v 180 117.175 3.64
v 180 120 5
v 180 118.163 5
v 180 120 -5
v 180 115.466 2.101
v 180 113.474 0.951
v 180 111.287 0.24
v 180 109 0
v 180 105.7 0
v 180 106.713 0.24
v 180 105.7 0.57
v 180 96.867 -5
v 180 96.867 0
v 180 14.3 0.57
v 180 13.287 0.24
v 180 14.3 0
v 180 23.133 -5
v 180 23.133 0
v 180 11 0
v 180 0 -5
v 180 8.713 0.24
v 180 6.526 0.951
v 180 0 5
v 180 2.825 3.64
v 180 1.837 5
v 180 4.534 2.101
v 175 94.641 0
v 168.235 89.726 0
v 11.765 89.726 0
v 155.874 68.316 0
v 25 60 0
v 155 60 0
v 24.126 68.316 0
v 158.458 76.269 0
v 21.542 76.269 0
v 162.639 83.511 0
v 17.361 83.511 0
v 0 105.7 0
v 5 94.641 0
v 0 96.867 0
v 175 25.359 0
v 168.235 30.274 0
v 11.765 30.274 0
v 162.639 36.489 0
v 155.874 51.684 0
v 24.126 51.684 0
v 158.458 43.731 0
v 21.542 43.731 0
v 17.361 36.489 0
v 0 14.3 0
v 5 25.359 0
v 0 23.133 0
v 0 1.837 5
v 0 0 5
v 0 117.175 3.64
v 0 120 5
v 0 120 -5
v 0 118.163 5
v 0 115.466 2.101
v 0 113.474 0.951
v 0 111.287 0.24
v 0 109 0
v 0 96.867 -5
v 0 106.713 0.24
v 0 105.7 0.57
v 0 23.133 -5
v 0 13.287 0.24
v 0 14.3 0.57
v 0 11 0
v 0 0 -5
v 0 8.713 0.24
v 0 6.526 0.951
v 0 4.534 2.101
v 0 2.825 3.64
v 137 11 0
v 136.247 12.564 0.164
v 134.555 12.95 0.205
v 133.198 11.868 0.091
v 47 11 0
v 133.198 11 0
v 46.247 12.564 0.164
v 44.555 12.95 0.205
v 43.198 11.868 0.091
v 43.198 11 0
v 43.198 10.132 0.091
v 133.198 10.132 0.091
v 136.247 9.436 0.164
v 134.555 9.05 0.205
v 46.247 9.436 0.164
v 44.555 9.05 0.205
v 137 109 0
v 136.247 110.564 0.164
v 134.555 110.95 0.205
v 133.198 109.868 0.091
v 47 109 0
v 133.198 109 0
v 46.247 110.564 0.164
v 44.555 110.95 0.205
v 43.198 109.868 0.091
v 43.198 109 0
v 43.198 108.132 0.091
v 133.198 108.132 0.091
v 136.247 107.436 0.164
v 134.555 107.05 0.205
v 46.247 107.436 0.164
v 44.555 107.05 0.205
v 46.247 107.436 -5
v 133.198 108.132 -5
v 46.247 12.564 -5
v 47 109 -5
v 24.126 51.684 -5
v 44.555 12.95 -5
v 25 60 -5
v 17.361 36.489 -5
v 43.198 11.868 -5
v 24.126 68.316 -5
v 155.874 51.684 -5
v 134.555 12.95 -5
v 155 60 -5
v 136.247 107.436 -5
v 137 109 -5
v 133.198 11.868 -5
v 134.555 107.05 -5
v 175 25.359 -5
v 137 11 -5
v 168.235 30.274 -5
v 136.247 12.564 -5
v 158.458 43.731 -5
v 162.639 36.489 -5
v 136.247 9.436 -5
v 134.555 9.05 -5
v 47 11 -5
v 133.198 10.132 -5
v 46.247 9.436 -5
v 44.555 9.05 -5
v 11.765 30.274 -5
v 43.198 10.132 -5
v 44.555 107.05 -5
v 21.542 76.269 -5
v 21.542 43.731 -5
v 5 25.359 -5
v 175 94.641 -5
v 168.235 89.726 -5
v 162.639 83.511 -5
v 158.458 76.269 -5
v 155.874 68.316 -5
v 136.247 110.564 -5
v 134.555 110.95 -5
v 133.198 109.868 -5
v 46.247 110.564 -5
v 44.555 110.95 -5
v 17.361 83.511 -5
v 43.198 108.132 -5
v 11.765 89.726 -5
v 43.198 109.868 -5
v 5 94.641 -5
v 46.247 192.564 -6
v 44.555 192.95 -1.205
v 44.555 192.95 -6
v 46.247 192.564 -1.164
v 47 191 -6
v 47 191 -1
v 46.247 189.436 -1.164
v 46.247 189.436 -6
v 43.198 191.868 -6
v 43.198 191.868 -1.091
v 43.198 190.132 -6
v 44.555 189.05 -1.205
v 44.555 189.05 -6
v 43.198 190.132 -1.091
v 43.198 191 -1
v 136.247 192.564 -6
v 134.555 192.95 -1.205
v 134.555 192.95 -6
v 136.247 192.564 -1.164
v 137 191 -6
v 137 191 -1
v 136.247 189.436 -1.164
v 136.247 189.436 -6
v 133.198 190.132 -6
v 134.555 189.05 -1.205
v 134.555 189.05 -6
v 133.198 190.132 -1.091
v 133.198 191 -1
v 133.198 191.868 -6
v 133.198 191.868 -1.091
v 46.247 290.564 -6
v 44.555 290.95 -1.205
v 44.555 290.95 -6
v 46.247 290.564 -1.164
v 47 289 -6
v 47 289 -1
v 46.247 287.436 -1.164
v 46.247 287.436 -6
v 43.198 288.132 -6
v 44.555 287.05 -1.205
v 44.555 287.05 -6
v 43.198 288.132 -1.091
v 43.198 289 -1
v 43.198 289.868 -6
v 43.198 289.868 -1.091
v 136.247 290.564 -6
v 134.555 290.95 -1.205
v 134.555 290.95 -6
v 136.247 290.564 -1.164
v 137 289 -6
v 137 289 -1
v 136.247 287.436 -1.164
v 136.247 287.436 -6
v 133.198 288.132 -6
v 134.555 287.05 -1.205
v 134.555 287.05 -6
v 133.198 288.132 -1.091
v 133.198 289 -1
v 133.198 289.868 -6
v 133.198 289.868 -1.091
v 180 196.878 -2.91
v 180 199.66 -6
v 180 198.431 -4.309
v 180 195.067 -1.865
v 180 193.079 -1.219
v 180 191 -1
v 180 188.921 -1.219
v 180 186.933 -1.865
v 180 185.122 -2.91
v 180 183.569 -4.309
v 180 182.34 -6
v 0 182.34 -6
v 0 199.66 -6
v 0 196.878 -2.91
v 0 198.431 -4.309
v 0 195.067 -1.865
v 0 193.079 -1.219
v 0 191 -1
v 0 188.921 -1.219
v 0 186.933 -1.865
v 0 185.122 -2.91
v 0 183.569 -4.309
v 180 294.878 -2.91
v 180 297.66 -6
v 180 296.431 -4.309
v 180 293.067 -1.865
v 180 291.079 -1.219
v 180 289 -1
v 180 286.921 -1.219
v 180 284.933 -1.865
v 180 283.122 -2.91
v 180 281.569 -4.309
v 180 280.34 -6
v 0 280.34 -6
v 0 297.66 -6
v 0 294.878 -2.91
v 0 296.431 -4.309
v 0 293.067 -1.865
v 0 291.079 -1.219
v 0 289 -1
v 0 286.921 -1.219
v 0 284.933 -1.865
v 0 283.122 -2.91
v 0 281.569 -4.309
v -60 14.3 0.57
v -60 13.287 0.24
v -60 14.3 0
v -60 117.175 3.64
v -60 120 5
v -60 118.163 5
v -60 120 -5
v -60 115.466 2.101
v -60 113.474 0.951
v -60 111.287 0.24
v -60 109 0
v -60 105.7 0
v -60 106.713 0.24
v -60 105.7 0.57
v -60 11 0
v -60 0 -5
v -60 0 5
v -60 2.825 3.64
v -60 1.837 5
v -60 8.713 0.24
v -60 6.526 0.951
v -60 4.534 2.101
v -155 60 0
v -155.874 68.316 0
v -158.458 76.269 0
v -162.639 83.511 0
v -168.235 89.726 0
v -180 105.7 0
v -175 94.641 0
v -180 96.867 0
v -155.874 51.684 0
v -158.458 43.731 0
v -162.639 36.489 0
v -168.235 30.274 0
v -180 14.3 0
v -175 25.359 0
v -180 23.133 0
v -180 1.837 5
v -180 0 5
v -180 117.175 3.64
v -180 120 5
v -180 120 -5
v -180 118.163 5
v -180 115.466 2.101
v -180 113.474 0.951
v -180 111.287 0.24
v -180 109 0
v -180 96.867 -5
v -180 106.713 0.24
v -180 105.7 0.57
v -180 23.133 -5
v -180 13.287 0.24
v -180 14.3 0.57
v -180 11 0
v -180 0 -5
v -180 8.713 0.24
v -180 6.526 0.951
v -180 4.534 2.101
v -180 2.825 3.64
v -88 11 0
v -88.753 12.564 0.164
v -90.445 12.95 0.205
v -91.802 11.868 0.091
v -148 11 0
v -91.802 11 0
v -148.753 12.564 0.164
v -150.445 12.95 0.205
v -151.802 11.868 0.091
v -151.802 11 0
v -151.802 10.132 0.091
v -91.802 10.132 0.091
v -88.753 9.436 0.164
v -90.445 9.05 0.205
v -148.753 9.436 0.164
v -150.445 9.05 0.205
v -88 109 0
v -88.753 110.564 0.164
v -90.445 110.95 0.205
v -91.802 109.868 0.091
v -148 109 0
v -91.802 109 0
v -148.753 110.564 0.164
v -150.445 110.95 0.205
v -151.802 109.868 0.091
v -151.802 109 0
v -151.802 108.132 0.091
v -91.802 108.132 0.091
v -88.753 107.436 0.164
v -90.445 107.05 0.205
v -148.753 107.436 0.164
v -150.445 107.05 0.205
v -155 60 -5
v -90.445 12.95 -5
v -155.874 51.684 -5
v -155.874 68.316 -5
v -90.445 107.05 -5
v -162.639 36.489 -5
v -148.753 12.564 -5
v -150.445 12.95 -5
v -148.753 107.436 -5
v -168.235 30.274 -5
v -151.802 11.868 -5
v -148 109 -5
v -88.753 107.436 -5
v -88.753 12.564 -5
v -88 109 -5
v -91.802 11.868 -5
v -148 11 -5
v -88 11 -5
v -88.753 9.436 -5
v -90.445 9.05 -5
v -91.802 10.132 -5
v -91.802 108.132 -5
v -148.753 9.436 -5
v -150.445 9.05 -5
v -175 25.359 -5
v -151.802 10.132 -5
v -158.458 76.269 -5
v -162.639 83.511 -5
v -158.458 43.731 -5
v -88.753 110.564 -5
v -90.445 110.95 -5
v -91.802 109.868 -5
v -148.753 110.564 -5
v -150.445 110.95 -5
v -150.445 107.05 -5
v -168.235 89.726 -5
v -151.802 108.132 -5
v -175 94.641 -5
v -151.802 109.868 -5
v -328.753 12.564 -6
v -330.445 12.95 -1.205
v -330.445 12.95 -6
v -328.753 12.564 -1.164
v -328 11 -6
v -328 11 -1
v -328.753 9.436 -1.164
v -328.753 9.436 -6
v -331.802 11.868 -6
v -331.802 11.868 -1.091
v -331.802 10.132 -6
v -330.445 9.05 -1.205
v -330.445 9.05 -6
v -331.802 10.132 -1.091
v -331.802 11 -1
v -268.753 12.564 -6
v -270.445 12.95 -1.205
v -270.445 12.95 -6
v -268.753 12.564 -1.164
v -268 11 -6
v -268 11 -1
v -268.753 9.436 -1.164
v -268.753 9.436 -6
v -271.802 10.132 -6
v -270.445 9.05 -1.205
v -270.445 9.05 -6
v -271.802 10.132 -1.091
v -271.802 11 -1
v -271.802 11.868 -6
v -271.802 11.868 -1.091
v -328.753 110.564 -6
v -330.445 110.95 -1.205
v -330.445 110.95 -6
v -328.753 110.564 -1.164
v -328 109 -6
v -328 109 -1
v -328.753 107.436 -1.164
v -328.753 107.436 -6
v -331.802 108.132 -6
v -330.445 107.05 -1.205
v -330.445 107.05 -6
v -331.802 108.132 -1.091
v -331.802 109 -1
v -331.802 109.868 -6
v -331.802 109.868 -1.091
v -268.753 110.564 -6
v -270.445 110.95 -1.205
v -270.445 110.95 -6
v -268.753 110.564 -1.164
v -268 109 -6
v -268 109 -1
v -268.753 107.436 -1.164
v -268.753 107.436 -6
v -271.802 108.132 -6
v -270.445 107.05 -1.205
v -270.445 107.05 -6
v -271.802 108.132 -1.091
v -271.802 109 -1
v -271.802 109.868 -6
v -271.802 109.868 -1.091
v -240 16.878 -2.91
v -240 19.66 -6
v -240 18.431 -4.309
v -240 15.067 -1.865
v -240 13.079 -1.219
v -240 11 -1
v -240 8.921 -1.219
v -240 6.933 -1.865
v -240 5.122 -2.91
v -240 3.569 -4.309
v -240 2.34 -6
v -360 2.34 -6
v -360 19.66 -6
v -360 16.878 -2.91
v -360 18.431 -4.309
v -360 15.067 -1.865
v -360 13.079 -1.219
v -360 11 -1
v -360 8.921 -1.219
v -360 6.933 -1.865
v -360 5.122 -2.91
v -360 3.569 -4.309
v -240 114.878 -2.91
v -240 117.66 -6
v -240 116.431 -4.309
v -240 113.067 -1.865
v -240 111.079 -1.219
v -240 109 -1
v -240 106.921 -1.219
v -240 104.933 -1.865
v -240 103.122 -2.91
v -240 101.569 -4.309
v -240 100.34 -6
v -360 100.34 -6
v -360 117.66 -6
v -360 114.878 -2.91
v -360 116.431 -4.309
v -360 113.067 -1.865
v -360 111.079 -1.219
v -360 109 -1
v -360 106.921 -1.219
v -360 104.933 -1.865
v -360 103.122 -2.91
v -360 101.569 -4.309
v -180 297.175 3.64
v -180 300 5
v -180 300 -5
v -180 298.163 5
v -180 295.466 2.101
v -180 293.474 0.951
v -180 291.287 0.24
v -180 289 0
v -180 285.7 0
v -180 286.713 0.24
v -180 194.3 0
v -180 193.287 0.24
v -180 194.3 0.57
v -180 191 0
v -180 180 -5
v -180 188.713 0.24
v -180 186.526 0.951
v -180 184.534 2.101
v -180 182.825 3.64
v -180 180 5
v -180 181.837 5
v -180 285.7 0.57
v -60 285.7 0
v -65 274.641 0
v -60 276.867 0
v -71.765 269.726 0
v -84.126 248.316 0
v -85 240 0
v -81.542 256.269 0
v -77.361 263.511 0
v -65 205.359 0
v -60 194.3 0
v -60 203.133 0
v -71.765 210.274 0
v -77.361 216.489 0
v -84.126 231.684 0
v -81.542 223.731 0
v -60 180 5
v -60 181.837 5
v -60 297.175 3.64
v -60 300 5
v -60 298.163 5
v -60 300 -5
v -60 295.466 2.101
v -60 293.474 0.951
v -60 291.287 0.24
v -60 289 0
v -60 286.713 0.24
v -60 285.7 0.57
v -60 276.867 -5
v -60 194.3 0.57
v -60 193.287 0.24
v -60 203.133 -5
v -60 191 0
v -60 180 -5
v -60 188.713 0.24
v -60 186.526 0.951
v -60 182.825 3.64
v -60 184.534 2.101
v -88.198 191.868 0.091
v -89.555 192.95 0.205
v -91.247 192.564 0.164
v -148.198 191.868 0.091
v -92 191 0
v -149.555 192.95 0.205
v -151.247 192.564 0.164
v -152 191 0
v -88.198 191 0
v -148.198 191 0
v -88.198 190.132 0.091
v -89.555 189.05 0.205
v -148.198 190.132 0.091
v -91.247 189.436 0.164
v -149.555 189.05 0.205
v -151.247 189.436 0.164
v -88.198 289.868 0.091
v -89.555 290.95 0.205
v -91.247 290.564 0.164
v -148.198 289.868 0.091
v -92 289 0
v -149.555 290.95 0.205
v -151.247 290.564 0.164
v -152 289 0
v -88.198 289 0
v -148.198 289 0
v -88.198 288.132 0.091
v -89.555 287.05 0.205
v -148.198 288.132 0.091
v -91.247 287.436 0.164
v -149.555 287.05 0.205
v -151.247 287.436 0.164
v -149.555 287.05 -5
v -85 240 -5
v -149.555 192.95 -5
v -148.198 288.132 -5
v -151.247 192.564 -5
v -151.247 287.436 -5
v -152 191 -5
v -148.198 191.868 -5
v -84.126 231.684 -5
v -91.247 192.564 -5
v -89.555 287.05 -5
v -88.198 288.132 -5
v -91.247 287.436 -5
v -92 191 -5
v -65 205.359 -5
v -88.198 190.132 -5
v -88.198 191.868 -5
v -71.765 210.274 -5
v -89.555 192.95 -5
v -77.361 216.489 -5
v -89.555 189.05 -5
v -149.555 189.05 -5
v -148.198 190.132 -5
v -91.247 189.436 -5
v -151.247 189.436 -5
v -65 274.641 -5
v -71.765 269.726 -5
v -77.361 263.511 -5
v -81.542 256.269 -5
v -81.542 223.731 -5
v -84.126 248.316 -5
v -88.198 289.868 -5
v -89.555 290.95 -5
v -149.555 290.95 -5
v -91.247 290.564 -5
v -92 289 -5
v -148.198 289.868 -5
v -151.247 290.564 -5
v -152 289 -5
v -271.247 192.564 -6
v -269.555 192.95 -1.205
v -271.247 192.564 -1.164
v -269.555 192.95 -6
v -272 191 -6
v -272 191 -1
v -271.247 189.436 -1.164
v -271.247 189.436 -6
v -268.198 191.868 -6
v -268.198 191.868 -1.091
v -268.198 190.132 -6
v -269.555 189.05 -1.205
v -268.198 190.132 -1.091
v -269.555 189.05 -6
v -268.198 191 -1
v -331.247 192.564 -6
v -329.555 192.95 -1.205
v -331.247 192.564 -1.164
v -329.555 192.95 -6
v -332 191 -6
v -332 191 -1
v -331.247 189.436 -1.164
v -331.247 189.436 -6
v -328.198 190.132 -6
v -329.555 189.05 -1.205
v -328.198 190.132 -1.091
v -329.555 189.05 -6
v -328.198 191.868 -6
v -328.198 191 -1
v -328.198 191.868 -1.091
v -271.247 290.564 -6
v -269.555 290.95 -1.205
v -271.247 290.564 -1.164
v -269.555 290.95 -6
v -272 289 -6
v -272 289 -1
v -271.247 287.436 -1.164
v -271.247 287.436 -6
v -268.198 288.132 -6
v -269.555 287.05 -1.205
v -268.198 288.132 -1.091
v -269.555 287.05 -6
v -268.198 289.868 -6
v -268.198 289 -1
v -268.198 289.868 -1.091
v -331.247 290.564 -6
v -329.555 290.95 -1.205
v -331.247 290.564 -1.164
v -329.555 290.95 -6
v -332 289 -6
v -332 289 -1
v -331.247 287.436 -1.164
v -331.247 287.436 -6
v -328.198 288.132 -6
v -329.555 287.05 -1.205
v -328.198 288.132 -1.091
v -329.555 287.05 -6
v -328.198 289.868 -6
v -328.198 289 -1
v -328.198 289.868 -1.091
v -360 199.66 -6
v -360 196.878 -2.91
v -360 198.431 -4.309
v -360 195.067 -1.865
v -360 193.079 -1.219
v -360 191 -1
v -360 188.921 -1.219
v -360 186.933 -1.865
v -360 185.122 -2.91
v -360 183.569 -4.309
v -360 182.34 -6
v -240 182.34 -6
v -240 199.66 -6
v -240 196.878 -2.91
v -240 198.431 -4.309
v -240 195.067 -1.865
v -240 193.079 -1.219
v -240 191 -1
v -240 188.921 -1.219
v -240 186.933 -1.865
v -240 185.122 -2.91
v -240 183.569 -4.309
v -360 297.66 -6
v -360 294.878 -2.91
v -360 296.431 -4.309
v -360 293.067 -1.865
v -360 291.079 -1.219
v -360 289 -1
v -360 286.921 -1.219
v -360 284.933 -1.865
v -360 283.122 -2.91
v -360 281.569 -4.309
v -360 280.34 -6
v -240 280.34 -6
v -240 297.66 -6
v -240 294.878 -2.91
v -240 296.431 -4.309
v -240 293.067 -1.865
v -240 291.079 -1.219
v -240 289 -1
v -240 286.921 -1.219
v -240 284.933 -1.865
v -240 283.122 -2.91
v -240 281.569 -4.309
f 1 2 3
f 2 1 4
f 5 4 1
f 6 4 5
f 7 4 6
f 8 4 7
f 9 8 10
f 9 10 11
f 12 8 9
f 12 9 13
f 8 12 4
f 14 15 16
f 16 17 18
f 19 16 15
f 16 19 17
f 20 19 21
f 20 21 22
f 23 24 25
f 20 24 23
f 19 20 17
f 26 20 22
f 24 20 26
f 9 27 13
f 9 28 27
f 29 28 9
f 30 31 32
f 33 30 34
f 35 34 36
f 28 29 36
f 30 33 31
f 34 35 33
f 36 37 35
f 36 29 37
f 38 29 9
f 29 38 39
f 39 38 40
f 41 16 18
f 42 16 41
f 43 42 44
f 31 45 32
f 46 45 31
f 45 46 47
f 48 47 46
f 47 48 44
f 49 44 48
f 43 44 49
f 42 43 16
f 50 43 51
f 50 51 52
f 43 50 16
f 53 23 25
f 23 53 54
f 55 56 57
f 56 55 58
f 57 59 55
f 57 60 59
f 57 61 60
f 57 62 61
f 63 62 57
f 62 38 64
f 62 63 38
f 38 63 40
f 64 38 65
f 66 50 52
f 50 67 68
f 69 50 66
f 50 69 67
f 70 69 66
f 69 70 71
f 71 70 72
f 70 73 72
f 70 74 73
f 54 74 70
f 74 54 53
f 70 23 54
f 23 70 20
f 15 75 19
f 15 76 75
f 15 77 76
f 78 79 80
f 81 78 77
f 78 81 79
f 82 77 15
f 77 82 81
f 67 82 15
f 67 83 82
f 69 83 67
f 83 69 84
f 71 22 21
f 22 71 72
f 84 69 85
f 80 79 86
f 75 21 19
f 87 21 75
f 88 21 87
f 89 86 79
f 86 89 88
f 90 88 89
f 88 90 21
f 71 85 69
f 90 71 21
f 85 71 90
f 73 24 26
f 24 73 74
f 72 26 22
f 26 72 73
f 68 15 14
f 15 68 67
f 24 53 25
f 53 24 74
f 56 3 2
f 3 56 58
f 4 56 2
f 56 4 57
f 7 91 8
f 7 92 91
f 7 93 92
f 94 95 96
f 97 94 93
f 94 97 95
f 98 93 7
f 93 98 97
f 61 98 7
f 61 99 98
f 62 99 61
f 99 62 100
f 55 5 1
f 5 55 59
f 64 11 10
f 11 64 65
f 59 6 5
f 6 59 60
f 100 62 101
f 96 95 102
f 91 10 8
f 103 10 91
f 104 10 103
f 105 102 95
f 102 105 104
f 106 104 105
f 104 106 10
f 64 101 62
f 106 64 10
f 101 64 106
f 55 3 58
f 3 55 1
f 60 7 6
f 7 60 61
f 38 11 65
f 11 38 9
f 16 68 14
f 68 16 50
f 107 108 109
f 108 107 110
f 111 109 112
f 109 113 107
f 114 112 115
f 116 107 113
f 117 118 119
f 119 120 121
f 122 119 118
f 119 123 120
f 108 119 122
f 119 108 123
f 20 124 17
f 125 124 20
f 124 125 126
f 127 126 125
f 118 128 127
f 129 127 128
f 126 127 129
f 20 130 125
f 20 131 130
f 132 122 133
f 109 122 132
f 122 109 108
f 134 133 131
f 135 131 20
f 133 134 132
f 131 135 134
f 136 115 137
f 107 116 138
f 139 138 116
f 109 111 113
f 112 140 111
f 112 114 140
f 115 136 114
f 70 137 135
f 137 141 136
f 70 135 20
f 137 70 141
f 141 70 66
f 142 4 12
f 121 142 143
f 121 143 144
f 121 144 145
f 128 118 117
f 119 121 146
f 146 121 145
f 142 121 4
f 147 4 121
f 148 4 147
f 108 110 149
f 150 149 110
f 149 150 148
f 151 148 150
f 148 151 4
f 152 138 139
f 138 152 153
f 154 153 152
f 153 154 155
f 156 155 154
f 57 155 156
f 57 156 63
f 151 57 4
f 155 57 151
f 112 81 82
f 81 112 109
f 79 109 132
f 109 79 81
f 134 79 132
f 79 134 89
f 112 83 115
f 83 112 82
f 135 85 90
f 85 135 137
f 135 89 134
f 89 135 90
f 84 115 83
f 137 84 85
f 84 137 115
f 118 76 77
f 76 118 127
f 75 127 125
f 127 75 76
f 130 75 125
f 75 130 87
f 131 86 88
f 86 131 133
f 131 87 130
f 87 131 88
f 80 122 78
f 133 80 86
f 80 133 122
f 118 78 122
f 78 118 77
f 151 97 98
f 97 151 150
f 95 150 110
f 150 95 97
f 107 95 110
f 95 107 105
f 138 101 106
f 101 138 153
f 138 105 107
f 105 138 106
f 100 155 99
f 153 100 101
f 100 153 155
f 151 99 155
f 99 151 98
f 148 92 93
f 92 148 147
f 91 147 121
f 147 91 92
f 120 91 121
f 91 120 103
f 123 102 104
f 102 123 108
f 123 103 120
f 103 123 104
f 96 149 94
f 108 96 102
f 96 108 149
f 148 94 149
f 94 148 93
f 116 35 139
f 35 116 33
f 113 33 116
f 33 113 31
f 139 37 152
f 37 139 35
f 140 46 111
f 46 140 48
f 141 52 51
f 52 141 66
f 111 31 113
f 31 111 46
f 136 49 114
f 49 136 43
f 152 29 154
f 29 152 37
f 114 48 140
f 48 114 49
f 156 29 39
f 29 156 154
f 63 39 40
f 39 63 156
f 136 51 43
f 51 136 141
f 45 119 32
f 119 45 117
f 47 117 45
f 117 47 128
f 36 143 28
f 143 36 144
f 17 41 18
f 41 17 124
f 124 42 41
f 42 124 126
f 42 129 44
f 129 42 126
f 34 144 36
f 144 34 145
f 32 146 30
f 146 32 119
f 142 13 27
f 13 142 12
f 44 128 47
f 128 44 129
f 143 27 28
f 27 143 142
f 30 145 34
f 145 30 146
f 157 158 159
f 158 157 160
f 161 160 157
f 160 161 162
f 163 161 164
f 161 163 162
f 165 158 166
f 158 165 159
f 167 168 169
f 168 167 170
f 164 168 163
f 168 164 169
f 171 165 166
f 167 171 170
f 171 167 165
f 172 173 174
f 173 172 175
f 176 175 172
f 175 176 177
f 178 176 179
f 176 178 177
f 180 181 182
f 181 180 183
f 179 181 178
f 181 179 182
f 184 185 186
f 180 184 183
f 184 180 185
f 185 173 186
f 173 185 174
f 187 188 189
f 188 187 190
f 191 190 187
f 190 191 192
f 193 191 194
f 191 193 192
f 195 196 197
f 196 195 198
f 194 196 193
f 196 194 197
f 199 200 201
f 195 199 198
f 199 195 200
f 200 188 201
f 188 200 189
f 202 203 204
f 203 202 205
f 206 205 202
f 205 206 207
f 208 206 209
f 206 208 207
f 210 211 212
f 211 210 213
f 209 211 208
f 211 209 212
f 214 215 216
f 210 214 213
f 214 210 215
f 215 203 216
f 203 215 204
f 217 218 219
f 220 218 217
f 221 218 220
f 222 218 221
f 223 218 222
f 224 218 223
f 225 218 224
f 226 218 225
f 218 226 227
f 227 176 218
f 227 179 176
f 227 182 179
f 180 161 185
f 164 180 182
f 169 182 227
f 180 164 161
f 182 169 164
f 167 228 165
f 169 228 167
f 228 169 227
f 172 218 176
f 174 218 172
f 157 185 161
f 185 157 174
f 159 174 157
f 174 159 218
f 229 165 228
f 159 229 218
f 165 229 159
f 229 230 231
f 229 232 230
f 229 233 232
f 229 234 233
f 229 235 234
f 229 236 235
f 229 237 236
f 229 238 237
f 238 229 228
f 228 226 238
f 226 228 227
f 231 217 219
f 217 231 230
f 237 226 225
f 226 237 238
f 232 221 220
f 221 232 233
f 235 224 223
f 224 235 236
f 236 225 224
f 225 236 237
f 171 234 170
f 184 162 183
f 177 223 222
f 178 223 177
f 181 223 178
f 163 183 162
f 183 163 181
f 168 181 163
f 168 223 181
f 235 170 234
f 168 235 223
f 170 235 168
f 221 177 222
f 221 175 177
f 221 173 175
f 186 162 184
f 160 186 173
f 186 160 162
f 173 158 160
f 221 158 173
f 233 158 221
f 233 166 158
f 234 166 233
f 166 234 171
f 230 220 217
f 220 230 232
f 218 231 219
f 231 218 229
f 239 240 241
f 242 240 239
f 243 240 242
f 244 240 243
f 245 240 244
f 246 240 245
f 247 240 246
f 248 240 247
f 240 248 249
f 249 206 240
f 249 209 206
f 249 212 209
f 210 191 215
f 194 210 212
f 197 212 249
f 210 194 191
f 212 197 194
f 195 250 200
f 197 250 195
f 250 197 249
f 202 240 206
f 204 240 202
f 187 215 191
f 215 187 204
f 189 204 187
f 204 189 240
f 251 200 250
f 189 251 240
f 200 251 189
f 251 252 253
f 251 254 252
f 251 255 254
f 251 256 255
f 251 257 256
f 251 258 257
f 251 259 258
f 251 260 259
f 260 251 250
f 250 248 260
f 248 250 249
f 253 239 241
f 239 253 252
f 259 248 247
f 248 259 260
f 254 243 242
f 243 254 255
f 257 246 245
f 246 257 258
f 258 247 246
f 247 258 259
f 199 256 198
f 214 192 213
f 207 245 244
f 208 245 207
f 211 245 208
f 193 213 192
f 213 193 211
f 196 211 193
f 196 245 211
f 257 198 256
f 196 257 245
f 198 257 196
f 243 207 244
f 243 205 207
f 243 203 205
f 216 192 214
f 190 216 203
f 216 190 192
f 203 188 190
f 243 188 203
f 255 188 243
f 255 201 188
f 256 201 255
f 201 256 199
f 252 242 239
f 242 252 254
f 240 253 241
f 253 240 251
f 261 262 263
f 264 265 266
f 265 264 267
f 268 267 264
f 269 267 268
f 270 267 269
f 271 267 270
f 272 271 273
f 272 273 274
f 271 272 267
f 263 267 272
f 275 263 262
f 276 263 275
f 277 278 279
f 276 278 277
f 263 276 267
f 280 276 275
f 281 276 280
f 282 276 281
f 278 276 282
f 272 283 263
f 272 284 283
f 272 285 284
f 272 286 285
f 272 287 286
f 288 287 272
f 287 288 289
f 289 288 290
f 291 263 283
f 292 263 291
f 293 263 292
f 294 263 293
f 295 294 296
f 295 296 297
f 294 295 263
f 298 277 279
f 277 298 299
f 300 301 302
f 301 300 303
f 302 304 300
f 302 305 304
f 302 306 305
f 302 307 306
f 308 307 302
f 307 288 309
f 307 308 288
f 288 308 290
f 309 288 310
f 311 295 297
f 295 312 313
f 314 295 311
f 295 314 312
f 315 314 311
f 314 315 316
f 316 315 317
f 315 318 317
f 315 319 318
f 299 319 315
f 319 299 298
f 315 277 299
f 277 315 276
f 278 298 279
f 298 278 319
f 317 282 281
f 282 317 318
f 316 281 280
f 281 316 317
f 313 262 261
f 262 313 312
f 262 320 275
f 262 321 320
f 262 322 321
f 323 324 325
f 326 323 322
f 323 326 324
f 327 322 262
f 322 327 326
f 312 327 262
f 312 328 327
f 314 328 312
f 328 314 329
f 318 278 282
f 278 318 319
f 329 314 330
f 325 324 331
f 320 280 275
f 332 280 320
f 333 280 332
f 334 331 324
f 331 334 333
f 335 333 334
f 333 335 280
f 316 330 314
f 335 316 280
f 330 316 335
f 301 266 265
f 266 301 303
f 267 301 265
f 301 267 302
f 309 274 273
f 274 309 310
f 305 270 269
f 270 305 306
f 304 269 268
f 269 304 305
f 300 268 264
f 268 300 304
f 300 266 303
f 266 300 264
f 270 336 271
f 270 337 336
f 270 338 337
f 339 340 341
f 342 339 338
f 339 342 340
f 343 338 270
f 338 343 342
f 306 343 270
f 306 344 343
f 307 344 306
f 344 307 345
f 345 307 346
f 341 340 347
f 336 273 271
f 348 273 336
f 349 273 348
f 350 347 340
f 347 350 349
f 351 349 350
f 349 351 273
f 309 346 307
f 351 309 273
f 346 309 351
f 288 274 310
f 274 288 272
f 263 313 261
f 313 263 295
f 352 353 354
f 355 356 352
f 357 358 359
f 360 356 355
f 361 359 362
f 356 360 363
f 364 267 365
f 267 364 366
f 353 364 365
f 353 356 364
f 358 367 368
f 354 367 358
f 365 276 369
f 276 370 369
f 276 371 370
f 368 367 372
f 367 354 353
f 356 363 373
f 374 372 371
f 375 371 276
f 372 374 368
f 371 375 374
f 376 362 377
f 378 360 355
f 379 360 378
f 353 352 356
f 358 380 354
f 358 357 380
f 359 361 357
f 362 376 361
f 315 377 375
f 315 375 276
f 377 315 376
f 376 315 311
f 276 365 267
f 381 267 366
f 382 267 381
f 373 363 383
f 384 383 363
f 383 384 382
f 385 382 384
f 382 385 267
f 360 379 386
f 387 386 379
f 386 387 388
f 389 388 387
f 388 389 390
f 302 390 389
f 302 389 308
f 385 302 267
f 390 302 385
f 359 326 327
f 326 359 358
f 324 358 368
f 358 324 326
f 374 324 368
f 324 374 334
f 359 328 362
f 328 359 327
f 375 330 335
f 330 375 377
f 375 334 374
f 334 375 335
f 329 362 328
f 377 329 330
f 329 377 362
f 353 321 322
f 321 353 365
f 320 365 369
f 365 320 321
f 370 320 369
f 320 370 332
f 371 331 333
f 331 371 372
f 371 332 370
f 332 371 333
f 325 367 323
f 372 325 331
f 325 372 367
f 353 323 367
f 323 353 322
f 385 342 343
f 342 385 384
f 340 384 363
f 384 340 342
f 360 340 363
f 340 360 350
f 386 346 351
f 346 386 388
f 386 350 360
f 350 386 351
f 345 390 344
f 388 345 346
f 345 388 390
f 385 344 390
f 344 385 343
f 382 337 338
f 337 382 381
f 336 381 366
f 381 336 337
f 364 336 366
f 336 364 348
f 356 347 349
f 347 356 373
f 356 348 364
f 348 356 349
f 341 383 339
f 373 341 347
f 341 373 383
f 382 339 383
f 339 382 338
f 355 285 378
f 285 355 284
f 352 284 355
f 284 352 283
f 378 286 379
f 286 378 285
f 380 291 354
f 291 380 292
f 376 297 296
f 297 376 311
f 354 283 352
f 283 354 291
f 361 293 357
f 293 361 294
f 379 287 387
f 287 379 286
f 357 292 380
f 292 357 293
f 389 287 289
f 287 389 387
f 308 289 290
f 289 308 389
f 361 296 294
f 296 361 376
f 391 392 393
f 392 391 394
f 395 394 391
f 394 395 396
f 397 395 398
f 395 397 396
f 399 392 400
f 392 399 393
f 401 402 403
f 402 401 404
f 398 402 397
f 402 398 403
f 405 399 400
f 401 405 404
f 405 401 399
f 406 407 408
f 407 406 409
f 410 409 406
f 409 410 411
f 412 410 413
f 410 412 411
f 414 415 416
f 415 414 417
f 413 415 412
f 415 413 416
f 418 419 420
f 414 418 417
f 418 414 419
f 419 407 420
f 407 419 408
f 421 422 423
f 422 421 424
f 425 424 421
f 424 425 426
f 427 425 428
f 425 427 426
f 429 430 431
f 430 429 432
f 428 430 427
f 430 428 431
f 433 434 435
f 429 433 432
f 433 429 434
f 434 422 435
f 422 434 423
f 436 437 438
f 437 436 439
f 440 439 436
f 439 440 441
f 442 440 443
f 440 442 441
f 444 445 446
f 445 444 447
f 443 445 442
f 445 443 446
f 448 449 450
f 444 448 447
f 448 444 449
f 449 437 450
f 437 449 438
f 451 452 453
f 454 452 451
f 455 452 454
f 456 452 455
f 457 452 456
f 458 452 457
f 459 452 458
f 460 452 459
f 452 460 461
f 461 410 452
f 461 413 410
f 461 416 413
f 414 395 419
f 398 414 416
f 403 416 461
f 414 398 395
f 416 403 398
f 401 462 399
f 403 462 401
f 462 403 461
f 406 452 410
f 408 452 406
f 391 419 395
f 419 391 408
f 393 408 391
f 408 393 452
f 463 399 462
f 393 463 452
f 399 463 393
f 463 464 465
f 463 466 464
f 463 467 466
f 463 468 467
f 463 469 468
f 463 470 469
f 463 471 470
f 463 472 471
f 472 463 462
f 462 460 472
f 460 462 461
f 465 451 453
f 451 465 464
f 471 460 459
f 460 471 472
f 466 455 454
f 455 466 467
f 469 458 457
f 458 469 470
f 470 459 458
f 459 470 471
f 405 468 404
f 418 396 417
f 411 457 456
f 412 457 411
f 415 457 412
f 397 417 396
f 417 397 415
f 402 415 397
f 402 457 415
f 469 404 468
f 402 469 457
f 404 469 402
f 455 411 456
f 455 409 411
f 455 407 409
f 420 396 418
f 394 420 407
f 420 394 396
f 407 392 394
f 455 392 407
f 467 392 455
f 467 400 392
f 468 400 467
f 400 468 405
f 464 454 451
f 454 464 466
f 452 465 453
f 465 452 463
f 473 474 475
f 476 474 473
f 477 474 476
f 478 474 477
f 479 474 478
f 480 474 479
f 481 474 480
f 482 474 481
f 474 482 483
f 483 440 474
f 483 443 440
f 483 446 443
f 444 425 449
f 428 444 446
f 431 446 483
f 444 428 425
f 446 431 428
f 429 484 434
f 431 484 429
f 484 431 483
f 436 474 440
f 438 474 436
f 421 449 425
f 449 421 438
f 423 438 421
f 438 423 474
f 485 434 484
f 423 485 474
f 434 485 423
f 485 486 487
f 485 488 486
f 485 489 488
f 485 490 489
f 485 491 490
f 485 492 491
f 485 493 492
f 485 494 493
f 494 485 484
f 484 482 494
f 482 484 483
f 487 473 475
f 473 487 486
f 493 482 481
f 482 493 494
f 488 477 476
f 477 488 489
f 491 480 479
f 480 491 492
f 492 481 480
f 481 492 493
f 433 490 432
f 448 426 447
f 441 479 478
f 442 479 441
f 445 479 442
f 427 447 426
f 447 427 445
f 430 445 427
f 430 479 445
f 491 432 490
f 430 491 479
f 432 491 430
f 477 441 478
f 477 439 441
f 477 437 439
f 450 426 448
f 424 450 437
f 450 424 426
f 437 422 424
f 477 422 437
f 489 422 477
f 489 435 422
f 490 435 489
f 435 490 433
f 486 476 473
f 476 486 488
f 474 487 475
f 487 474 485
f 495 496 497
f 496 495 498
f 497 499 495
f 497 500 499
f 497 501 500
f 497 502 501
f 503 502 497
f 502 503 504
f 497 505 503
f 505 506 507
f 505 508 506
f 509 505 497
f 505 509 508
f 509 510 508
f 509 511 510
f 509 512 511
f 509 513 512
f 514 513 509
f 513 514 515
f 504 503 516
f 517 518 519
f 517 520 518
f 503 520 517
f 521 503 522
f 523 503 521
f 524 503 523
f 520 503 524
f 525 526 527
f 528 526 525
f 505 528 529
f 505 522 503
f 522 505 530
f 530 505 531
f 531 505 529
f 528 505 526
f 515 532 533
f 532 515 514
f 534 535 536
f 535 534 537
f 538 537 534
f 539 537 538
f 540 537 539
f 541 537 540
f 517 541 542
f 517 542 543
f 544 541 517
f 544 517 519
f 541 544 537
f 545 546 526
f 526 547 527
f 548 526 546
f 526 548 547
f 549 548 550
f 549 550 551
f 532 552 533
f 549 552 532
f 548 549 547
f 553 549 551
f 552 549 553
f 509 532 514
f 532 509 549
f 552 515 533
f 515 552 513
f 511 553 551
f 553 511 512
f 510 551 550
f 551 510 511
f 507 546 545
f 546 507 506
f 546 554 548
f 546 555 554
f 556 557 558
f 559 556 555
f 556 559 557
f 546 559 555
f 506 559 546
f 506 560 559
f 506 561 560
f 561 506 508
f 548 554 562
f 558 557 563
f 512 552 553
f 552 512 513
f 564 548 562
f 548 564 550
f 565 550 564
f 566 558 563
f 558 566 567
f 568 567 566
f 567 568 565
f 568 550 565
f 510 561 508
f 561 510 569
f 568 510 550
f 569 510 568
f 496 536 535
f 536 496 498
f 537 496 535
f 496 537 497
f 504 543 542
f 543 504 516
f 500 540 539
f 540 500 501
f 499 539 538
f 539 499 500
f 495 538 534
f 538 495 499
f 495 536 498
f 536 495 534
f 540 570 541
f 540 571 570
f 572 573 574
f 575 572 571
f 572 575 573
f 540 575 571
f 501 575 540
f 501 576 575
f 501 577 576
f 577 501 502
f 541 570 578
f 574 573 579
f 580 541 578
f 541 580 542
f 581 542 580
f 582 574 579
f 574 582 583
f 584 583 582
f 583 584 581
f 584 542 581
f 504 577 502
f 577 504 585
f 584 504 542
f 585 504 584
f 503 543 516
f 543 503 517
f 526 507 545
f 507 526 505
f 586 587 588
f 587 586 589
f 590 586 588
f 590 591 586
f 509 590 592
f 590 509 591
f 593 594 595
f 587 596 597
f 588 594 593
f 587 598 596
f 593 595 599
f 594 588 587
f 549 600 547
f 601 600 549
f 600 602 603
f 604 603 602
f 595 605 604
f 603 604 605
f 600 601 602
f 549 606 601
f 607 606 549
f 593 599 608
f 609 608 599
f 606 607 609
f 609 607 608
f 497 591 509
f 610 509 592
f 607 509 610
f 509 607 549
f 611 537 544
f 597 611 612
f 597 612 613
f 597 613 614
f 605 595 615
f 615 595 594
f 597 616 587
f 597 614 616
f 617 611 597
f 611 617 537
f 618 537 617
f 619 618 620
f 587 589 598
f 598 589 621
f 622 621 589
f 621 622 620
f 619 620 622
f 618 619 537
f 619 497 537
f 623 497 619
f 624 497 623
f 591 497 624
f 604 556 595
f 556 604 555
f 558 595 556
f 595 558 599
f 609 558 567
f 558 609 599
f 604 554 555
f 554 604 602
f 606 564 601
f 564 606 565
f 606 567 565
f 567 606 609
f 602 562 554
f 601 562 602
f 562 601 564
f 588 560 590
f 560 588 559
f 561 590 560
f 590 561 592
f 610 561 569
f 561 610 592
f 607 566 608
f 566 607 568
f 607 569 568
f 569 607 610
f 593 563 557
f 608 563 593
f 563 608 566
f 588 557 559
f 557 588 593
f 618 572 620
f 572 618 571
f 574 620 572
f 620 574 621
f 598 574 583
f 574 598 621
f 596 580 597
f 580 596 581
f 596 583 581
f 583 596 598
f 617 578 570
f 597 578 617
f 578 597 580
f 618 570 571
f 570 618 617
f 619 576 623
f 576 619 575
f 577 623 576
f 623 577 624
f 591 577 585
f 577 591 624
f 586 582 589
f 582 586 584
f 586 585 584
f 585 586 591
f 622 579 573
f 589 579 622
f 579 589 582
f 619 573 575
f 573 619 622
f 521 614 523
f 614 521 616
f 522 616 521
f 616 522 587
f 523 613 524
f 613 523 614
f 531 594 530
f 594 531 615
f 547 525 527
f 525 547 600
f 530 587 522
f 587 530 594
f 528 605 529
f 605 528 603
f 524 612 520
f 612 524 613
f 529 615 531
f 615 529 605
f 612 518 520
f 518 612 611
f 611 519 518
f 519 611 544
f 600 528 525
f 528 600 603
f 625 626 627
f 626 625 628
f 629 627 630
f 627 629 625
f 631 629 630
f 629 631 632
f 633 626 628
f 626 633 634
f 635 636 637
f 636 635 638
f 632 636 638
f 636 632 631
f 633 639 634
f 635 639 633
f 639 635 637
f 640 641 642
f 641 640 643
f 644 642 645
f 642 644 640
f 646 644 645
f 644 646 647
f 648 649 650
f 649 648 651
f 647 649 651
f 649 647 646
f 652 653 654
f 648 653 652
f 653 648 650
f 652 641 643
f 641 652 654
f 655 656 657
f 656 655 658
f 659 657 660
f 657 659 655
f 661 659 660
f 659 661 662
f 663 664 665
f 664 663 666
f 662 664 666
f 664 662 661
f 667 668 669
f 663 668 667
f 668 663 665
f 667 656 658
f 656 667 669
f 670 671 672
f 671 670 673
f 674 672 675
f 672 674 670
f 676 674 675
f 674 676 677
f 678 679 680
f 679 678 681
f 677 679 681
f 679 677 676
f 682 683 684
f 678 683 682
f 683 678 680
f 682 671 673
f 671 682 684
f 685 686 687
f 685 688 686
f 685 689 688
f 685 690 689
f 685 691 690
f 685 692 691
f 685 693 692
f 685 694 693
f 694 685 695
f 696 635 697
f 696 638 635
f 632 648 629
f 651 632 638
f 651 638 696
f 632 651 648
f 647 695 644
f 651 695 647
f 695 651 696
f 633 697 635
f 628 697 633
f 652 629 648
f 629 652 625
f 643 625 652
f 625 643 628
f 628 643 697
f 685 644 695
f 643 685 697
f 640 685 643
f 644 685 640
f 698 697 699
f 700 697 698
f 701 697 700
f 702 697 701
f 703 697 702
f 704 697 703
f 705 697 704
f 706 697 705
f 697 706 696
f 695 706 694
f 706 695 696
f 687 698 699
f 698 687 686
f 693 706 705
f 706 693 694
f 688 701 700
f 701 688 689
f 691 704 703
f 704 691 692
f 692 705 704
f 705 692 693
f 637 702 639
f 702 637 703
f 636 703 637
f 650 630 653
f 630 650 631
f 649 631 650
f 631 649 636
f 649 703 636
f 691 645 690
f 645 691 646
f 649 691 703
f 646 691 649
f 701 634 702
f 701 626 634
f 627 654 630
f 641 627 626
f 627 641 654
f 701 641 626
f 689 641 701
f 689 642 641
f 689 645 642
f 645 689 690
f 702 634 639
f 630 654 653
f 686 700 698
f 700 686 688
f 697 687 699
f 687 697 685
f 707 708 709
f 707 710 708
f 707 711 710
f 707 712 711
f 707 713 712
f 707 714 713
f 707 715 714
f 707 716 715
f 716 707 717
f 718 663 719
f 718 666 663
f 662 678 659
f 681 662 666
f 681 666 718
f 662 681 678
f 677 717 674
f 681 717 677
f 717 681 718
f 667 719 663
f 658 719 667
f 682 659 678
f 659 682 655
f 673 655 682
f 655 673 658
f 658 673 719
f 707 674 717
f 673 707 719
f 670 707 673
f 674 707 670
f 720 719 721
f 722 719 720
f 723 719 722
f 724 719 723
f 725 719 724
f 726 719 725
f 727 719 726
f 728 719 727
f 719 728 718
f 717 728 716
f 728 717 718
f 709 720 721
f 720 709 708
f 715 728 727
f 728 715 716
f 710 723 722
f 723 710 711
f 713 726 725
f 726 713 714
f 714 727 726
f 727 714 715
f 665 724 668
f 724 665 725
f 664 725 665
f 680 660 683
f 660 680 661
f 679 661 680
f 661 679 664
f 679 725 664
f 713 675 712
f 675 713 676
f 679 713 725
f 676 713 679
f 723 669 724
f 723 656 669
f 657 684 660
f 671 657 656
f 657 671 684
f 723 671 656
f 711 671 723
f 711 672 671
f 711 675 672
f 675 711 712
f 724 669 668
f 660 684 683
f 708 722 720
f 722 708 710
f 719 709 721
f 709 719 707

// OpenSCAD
// tube outer diameter [mm]
tube_od=22;
// tube inner diameter [mm]
tube_id=20;
screw_od=4;
plate_width=120;
plate_length=120;
plate_thickness=5;
cradle_thickness=5;

module cradle(length,heigth) {
    translate([-length/2,0,-tube_od/2])
    difference() {
        translate([0,-tube_od/2,tube_od/2-height])
        cube([length,tube_od,height]);
        
        translate([-1,0,0])
        rotate([0,90,0])
        cylinder(length+2,tube_od/2,tube_od/2);
    }
}


module plate(length,width,thickness) {
    // top plate
    cube([length,width,thickness],false);
    
    offset=tube_od*1.3;
    
    difference() {
    
    union() {
            // cradles
            translate([length/2,tube_od/2,0])
            cradle(length=length,height=cradle_thickness);
            
            translate([length/2,width-tube_od/2,0])
            cradle(length=length, height=cradle_thickness);
        }
        //color([1,0,0])
        translate([-1,offset/2,-cradle_thickness*1.5])
        cube([length+2,width-offset,cradle_thickness*1.5],false);
    }
}

module mounting_holes(length,width,thickness) {
    screw_length=thickness+tube_od+2;
    translate([length/4,tube_od/2,-screw_length/2])
    cylinder(screw_length,screw_od/2,screw_od/2);
    
    translate([3*length/4,tube_od/2,-screw_length/2])
    cylinder(screw_length,screw_od/2,screw_od/2);
    
    translate([length/4,width-tube_od/2,-screw_length/2])
    cylinder(screw_length,screw_od/2,screw_od/2);
    
    translate([3*length/4,width-tube_od/2,-screw_length/2])
    cylinder(screw_length,screw_od/2,screw_od/2);
}

module cradle_contra(length,height) {
    intersection() {    
        translate([0,-tube_od/2,height])
        cube([length,tube_od,height]);

        rotate([0,90,0])
        cylinder(length,tube_id/2,tube_id/2);
    }
}

module plate_contra(length,width,height) {        
    translate([0,tube_od/2,-tube_od/2])
    cradle_contra(length,height);
    
    translate([0,width-tube_od/2,-tube_od/2])
    cradle_contra(length,height);
}

module base_plate(length,width,with_plate,with_contra) {
    difference() {
        union() {
            if(with_plate)
                plate(length,width,plate_thickness);
            if(with_contra)
                plate_contra(length,width,plate_thickness);
        }
        mounting_holes(length,width,plate_thickness);
    }
}

module outer_plate(with_plate,with_contra) {
    difference() {
        base_plate(plate_length,plate_width,with_plate,with_contra);
        
        translate([-plate_width/8,plate_width/2,-10])
        cylinder(60,plate_width/3,plate_width/3);
    }
}

module inner_plate(with_plate,with_contra) {
    length=plate_length*1.5;
    difference() {
        base_plate(length,plate_width,with_plate,with_contra);
        
        translate([-plate_width/8,plate_width/2,-10])
        cylinder(60,plate_width/3,plate_width/3);

        translate([length+plate_width/8,plate_width/2,-10])
        cylinder(60,plate_width/3,plate_width/3);
    }
}


module all() {
    // inner plate
    mirror([0,0,1])
    inner_plate(true,false);
    
    // inner plate contra
    translate([0,plate_width*1.5,0])
    inner_plate(false,true);

    // outer plate 1
    translate([-plate_length*1.5,0,0])
    mirror([0,0,1])
    outer_plate(true,false);
    
    // outer plate 1 contra
    translate([-plate_length*3,0,0])
    outer_plate(false,true);

    // outer plate 2
    translate([-plate_width*0.5,plate_width*1.5,0])
    mirror([1,0,0])
    mirror([0,0,1])
    outer_plate(true,false);

    // outer plate 2 contra
    translate([-plate_width*2,plate_width*1.5,0])
    mirror([1,0,0])
    outer_plate(false,true);
    
}

//inner_plate(true,true);

all();
